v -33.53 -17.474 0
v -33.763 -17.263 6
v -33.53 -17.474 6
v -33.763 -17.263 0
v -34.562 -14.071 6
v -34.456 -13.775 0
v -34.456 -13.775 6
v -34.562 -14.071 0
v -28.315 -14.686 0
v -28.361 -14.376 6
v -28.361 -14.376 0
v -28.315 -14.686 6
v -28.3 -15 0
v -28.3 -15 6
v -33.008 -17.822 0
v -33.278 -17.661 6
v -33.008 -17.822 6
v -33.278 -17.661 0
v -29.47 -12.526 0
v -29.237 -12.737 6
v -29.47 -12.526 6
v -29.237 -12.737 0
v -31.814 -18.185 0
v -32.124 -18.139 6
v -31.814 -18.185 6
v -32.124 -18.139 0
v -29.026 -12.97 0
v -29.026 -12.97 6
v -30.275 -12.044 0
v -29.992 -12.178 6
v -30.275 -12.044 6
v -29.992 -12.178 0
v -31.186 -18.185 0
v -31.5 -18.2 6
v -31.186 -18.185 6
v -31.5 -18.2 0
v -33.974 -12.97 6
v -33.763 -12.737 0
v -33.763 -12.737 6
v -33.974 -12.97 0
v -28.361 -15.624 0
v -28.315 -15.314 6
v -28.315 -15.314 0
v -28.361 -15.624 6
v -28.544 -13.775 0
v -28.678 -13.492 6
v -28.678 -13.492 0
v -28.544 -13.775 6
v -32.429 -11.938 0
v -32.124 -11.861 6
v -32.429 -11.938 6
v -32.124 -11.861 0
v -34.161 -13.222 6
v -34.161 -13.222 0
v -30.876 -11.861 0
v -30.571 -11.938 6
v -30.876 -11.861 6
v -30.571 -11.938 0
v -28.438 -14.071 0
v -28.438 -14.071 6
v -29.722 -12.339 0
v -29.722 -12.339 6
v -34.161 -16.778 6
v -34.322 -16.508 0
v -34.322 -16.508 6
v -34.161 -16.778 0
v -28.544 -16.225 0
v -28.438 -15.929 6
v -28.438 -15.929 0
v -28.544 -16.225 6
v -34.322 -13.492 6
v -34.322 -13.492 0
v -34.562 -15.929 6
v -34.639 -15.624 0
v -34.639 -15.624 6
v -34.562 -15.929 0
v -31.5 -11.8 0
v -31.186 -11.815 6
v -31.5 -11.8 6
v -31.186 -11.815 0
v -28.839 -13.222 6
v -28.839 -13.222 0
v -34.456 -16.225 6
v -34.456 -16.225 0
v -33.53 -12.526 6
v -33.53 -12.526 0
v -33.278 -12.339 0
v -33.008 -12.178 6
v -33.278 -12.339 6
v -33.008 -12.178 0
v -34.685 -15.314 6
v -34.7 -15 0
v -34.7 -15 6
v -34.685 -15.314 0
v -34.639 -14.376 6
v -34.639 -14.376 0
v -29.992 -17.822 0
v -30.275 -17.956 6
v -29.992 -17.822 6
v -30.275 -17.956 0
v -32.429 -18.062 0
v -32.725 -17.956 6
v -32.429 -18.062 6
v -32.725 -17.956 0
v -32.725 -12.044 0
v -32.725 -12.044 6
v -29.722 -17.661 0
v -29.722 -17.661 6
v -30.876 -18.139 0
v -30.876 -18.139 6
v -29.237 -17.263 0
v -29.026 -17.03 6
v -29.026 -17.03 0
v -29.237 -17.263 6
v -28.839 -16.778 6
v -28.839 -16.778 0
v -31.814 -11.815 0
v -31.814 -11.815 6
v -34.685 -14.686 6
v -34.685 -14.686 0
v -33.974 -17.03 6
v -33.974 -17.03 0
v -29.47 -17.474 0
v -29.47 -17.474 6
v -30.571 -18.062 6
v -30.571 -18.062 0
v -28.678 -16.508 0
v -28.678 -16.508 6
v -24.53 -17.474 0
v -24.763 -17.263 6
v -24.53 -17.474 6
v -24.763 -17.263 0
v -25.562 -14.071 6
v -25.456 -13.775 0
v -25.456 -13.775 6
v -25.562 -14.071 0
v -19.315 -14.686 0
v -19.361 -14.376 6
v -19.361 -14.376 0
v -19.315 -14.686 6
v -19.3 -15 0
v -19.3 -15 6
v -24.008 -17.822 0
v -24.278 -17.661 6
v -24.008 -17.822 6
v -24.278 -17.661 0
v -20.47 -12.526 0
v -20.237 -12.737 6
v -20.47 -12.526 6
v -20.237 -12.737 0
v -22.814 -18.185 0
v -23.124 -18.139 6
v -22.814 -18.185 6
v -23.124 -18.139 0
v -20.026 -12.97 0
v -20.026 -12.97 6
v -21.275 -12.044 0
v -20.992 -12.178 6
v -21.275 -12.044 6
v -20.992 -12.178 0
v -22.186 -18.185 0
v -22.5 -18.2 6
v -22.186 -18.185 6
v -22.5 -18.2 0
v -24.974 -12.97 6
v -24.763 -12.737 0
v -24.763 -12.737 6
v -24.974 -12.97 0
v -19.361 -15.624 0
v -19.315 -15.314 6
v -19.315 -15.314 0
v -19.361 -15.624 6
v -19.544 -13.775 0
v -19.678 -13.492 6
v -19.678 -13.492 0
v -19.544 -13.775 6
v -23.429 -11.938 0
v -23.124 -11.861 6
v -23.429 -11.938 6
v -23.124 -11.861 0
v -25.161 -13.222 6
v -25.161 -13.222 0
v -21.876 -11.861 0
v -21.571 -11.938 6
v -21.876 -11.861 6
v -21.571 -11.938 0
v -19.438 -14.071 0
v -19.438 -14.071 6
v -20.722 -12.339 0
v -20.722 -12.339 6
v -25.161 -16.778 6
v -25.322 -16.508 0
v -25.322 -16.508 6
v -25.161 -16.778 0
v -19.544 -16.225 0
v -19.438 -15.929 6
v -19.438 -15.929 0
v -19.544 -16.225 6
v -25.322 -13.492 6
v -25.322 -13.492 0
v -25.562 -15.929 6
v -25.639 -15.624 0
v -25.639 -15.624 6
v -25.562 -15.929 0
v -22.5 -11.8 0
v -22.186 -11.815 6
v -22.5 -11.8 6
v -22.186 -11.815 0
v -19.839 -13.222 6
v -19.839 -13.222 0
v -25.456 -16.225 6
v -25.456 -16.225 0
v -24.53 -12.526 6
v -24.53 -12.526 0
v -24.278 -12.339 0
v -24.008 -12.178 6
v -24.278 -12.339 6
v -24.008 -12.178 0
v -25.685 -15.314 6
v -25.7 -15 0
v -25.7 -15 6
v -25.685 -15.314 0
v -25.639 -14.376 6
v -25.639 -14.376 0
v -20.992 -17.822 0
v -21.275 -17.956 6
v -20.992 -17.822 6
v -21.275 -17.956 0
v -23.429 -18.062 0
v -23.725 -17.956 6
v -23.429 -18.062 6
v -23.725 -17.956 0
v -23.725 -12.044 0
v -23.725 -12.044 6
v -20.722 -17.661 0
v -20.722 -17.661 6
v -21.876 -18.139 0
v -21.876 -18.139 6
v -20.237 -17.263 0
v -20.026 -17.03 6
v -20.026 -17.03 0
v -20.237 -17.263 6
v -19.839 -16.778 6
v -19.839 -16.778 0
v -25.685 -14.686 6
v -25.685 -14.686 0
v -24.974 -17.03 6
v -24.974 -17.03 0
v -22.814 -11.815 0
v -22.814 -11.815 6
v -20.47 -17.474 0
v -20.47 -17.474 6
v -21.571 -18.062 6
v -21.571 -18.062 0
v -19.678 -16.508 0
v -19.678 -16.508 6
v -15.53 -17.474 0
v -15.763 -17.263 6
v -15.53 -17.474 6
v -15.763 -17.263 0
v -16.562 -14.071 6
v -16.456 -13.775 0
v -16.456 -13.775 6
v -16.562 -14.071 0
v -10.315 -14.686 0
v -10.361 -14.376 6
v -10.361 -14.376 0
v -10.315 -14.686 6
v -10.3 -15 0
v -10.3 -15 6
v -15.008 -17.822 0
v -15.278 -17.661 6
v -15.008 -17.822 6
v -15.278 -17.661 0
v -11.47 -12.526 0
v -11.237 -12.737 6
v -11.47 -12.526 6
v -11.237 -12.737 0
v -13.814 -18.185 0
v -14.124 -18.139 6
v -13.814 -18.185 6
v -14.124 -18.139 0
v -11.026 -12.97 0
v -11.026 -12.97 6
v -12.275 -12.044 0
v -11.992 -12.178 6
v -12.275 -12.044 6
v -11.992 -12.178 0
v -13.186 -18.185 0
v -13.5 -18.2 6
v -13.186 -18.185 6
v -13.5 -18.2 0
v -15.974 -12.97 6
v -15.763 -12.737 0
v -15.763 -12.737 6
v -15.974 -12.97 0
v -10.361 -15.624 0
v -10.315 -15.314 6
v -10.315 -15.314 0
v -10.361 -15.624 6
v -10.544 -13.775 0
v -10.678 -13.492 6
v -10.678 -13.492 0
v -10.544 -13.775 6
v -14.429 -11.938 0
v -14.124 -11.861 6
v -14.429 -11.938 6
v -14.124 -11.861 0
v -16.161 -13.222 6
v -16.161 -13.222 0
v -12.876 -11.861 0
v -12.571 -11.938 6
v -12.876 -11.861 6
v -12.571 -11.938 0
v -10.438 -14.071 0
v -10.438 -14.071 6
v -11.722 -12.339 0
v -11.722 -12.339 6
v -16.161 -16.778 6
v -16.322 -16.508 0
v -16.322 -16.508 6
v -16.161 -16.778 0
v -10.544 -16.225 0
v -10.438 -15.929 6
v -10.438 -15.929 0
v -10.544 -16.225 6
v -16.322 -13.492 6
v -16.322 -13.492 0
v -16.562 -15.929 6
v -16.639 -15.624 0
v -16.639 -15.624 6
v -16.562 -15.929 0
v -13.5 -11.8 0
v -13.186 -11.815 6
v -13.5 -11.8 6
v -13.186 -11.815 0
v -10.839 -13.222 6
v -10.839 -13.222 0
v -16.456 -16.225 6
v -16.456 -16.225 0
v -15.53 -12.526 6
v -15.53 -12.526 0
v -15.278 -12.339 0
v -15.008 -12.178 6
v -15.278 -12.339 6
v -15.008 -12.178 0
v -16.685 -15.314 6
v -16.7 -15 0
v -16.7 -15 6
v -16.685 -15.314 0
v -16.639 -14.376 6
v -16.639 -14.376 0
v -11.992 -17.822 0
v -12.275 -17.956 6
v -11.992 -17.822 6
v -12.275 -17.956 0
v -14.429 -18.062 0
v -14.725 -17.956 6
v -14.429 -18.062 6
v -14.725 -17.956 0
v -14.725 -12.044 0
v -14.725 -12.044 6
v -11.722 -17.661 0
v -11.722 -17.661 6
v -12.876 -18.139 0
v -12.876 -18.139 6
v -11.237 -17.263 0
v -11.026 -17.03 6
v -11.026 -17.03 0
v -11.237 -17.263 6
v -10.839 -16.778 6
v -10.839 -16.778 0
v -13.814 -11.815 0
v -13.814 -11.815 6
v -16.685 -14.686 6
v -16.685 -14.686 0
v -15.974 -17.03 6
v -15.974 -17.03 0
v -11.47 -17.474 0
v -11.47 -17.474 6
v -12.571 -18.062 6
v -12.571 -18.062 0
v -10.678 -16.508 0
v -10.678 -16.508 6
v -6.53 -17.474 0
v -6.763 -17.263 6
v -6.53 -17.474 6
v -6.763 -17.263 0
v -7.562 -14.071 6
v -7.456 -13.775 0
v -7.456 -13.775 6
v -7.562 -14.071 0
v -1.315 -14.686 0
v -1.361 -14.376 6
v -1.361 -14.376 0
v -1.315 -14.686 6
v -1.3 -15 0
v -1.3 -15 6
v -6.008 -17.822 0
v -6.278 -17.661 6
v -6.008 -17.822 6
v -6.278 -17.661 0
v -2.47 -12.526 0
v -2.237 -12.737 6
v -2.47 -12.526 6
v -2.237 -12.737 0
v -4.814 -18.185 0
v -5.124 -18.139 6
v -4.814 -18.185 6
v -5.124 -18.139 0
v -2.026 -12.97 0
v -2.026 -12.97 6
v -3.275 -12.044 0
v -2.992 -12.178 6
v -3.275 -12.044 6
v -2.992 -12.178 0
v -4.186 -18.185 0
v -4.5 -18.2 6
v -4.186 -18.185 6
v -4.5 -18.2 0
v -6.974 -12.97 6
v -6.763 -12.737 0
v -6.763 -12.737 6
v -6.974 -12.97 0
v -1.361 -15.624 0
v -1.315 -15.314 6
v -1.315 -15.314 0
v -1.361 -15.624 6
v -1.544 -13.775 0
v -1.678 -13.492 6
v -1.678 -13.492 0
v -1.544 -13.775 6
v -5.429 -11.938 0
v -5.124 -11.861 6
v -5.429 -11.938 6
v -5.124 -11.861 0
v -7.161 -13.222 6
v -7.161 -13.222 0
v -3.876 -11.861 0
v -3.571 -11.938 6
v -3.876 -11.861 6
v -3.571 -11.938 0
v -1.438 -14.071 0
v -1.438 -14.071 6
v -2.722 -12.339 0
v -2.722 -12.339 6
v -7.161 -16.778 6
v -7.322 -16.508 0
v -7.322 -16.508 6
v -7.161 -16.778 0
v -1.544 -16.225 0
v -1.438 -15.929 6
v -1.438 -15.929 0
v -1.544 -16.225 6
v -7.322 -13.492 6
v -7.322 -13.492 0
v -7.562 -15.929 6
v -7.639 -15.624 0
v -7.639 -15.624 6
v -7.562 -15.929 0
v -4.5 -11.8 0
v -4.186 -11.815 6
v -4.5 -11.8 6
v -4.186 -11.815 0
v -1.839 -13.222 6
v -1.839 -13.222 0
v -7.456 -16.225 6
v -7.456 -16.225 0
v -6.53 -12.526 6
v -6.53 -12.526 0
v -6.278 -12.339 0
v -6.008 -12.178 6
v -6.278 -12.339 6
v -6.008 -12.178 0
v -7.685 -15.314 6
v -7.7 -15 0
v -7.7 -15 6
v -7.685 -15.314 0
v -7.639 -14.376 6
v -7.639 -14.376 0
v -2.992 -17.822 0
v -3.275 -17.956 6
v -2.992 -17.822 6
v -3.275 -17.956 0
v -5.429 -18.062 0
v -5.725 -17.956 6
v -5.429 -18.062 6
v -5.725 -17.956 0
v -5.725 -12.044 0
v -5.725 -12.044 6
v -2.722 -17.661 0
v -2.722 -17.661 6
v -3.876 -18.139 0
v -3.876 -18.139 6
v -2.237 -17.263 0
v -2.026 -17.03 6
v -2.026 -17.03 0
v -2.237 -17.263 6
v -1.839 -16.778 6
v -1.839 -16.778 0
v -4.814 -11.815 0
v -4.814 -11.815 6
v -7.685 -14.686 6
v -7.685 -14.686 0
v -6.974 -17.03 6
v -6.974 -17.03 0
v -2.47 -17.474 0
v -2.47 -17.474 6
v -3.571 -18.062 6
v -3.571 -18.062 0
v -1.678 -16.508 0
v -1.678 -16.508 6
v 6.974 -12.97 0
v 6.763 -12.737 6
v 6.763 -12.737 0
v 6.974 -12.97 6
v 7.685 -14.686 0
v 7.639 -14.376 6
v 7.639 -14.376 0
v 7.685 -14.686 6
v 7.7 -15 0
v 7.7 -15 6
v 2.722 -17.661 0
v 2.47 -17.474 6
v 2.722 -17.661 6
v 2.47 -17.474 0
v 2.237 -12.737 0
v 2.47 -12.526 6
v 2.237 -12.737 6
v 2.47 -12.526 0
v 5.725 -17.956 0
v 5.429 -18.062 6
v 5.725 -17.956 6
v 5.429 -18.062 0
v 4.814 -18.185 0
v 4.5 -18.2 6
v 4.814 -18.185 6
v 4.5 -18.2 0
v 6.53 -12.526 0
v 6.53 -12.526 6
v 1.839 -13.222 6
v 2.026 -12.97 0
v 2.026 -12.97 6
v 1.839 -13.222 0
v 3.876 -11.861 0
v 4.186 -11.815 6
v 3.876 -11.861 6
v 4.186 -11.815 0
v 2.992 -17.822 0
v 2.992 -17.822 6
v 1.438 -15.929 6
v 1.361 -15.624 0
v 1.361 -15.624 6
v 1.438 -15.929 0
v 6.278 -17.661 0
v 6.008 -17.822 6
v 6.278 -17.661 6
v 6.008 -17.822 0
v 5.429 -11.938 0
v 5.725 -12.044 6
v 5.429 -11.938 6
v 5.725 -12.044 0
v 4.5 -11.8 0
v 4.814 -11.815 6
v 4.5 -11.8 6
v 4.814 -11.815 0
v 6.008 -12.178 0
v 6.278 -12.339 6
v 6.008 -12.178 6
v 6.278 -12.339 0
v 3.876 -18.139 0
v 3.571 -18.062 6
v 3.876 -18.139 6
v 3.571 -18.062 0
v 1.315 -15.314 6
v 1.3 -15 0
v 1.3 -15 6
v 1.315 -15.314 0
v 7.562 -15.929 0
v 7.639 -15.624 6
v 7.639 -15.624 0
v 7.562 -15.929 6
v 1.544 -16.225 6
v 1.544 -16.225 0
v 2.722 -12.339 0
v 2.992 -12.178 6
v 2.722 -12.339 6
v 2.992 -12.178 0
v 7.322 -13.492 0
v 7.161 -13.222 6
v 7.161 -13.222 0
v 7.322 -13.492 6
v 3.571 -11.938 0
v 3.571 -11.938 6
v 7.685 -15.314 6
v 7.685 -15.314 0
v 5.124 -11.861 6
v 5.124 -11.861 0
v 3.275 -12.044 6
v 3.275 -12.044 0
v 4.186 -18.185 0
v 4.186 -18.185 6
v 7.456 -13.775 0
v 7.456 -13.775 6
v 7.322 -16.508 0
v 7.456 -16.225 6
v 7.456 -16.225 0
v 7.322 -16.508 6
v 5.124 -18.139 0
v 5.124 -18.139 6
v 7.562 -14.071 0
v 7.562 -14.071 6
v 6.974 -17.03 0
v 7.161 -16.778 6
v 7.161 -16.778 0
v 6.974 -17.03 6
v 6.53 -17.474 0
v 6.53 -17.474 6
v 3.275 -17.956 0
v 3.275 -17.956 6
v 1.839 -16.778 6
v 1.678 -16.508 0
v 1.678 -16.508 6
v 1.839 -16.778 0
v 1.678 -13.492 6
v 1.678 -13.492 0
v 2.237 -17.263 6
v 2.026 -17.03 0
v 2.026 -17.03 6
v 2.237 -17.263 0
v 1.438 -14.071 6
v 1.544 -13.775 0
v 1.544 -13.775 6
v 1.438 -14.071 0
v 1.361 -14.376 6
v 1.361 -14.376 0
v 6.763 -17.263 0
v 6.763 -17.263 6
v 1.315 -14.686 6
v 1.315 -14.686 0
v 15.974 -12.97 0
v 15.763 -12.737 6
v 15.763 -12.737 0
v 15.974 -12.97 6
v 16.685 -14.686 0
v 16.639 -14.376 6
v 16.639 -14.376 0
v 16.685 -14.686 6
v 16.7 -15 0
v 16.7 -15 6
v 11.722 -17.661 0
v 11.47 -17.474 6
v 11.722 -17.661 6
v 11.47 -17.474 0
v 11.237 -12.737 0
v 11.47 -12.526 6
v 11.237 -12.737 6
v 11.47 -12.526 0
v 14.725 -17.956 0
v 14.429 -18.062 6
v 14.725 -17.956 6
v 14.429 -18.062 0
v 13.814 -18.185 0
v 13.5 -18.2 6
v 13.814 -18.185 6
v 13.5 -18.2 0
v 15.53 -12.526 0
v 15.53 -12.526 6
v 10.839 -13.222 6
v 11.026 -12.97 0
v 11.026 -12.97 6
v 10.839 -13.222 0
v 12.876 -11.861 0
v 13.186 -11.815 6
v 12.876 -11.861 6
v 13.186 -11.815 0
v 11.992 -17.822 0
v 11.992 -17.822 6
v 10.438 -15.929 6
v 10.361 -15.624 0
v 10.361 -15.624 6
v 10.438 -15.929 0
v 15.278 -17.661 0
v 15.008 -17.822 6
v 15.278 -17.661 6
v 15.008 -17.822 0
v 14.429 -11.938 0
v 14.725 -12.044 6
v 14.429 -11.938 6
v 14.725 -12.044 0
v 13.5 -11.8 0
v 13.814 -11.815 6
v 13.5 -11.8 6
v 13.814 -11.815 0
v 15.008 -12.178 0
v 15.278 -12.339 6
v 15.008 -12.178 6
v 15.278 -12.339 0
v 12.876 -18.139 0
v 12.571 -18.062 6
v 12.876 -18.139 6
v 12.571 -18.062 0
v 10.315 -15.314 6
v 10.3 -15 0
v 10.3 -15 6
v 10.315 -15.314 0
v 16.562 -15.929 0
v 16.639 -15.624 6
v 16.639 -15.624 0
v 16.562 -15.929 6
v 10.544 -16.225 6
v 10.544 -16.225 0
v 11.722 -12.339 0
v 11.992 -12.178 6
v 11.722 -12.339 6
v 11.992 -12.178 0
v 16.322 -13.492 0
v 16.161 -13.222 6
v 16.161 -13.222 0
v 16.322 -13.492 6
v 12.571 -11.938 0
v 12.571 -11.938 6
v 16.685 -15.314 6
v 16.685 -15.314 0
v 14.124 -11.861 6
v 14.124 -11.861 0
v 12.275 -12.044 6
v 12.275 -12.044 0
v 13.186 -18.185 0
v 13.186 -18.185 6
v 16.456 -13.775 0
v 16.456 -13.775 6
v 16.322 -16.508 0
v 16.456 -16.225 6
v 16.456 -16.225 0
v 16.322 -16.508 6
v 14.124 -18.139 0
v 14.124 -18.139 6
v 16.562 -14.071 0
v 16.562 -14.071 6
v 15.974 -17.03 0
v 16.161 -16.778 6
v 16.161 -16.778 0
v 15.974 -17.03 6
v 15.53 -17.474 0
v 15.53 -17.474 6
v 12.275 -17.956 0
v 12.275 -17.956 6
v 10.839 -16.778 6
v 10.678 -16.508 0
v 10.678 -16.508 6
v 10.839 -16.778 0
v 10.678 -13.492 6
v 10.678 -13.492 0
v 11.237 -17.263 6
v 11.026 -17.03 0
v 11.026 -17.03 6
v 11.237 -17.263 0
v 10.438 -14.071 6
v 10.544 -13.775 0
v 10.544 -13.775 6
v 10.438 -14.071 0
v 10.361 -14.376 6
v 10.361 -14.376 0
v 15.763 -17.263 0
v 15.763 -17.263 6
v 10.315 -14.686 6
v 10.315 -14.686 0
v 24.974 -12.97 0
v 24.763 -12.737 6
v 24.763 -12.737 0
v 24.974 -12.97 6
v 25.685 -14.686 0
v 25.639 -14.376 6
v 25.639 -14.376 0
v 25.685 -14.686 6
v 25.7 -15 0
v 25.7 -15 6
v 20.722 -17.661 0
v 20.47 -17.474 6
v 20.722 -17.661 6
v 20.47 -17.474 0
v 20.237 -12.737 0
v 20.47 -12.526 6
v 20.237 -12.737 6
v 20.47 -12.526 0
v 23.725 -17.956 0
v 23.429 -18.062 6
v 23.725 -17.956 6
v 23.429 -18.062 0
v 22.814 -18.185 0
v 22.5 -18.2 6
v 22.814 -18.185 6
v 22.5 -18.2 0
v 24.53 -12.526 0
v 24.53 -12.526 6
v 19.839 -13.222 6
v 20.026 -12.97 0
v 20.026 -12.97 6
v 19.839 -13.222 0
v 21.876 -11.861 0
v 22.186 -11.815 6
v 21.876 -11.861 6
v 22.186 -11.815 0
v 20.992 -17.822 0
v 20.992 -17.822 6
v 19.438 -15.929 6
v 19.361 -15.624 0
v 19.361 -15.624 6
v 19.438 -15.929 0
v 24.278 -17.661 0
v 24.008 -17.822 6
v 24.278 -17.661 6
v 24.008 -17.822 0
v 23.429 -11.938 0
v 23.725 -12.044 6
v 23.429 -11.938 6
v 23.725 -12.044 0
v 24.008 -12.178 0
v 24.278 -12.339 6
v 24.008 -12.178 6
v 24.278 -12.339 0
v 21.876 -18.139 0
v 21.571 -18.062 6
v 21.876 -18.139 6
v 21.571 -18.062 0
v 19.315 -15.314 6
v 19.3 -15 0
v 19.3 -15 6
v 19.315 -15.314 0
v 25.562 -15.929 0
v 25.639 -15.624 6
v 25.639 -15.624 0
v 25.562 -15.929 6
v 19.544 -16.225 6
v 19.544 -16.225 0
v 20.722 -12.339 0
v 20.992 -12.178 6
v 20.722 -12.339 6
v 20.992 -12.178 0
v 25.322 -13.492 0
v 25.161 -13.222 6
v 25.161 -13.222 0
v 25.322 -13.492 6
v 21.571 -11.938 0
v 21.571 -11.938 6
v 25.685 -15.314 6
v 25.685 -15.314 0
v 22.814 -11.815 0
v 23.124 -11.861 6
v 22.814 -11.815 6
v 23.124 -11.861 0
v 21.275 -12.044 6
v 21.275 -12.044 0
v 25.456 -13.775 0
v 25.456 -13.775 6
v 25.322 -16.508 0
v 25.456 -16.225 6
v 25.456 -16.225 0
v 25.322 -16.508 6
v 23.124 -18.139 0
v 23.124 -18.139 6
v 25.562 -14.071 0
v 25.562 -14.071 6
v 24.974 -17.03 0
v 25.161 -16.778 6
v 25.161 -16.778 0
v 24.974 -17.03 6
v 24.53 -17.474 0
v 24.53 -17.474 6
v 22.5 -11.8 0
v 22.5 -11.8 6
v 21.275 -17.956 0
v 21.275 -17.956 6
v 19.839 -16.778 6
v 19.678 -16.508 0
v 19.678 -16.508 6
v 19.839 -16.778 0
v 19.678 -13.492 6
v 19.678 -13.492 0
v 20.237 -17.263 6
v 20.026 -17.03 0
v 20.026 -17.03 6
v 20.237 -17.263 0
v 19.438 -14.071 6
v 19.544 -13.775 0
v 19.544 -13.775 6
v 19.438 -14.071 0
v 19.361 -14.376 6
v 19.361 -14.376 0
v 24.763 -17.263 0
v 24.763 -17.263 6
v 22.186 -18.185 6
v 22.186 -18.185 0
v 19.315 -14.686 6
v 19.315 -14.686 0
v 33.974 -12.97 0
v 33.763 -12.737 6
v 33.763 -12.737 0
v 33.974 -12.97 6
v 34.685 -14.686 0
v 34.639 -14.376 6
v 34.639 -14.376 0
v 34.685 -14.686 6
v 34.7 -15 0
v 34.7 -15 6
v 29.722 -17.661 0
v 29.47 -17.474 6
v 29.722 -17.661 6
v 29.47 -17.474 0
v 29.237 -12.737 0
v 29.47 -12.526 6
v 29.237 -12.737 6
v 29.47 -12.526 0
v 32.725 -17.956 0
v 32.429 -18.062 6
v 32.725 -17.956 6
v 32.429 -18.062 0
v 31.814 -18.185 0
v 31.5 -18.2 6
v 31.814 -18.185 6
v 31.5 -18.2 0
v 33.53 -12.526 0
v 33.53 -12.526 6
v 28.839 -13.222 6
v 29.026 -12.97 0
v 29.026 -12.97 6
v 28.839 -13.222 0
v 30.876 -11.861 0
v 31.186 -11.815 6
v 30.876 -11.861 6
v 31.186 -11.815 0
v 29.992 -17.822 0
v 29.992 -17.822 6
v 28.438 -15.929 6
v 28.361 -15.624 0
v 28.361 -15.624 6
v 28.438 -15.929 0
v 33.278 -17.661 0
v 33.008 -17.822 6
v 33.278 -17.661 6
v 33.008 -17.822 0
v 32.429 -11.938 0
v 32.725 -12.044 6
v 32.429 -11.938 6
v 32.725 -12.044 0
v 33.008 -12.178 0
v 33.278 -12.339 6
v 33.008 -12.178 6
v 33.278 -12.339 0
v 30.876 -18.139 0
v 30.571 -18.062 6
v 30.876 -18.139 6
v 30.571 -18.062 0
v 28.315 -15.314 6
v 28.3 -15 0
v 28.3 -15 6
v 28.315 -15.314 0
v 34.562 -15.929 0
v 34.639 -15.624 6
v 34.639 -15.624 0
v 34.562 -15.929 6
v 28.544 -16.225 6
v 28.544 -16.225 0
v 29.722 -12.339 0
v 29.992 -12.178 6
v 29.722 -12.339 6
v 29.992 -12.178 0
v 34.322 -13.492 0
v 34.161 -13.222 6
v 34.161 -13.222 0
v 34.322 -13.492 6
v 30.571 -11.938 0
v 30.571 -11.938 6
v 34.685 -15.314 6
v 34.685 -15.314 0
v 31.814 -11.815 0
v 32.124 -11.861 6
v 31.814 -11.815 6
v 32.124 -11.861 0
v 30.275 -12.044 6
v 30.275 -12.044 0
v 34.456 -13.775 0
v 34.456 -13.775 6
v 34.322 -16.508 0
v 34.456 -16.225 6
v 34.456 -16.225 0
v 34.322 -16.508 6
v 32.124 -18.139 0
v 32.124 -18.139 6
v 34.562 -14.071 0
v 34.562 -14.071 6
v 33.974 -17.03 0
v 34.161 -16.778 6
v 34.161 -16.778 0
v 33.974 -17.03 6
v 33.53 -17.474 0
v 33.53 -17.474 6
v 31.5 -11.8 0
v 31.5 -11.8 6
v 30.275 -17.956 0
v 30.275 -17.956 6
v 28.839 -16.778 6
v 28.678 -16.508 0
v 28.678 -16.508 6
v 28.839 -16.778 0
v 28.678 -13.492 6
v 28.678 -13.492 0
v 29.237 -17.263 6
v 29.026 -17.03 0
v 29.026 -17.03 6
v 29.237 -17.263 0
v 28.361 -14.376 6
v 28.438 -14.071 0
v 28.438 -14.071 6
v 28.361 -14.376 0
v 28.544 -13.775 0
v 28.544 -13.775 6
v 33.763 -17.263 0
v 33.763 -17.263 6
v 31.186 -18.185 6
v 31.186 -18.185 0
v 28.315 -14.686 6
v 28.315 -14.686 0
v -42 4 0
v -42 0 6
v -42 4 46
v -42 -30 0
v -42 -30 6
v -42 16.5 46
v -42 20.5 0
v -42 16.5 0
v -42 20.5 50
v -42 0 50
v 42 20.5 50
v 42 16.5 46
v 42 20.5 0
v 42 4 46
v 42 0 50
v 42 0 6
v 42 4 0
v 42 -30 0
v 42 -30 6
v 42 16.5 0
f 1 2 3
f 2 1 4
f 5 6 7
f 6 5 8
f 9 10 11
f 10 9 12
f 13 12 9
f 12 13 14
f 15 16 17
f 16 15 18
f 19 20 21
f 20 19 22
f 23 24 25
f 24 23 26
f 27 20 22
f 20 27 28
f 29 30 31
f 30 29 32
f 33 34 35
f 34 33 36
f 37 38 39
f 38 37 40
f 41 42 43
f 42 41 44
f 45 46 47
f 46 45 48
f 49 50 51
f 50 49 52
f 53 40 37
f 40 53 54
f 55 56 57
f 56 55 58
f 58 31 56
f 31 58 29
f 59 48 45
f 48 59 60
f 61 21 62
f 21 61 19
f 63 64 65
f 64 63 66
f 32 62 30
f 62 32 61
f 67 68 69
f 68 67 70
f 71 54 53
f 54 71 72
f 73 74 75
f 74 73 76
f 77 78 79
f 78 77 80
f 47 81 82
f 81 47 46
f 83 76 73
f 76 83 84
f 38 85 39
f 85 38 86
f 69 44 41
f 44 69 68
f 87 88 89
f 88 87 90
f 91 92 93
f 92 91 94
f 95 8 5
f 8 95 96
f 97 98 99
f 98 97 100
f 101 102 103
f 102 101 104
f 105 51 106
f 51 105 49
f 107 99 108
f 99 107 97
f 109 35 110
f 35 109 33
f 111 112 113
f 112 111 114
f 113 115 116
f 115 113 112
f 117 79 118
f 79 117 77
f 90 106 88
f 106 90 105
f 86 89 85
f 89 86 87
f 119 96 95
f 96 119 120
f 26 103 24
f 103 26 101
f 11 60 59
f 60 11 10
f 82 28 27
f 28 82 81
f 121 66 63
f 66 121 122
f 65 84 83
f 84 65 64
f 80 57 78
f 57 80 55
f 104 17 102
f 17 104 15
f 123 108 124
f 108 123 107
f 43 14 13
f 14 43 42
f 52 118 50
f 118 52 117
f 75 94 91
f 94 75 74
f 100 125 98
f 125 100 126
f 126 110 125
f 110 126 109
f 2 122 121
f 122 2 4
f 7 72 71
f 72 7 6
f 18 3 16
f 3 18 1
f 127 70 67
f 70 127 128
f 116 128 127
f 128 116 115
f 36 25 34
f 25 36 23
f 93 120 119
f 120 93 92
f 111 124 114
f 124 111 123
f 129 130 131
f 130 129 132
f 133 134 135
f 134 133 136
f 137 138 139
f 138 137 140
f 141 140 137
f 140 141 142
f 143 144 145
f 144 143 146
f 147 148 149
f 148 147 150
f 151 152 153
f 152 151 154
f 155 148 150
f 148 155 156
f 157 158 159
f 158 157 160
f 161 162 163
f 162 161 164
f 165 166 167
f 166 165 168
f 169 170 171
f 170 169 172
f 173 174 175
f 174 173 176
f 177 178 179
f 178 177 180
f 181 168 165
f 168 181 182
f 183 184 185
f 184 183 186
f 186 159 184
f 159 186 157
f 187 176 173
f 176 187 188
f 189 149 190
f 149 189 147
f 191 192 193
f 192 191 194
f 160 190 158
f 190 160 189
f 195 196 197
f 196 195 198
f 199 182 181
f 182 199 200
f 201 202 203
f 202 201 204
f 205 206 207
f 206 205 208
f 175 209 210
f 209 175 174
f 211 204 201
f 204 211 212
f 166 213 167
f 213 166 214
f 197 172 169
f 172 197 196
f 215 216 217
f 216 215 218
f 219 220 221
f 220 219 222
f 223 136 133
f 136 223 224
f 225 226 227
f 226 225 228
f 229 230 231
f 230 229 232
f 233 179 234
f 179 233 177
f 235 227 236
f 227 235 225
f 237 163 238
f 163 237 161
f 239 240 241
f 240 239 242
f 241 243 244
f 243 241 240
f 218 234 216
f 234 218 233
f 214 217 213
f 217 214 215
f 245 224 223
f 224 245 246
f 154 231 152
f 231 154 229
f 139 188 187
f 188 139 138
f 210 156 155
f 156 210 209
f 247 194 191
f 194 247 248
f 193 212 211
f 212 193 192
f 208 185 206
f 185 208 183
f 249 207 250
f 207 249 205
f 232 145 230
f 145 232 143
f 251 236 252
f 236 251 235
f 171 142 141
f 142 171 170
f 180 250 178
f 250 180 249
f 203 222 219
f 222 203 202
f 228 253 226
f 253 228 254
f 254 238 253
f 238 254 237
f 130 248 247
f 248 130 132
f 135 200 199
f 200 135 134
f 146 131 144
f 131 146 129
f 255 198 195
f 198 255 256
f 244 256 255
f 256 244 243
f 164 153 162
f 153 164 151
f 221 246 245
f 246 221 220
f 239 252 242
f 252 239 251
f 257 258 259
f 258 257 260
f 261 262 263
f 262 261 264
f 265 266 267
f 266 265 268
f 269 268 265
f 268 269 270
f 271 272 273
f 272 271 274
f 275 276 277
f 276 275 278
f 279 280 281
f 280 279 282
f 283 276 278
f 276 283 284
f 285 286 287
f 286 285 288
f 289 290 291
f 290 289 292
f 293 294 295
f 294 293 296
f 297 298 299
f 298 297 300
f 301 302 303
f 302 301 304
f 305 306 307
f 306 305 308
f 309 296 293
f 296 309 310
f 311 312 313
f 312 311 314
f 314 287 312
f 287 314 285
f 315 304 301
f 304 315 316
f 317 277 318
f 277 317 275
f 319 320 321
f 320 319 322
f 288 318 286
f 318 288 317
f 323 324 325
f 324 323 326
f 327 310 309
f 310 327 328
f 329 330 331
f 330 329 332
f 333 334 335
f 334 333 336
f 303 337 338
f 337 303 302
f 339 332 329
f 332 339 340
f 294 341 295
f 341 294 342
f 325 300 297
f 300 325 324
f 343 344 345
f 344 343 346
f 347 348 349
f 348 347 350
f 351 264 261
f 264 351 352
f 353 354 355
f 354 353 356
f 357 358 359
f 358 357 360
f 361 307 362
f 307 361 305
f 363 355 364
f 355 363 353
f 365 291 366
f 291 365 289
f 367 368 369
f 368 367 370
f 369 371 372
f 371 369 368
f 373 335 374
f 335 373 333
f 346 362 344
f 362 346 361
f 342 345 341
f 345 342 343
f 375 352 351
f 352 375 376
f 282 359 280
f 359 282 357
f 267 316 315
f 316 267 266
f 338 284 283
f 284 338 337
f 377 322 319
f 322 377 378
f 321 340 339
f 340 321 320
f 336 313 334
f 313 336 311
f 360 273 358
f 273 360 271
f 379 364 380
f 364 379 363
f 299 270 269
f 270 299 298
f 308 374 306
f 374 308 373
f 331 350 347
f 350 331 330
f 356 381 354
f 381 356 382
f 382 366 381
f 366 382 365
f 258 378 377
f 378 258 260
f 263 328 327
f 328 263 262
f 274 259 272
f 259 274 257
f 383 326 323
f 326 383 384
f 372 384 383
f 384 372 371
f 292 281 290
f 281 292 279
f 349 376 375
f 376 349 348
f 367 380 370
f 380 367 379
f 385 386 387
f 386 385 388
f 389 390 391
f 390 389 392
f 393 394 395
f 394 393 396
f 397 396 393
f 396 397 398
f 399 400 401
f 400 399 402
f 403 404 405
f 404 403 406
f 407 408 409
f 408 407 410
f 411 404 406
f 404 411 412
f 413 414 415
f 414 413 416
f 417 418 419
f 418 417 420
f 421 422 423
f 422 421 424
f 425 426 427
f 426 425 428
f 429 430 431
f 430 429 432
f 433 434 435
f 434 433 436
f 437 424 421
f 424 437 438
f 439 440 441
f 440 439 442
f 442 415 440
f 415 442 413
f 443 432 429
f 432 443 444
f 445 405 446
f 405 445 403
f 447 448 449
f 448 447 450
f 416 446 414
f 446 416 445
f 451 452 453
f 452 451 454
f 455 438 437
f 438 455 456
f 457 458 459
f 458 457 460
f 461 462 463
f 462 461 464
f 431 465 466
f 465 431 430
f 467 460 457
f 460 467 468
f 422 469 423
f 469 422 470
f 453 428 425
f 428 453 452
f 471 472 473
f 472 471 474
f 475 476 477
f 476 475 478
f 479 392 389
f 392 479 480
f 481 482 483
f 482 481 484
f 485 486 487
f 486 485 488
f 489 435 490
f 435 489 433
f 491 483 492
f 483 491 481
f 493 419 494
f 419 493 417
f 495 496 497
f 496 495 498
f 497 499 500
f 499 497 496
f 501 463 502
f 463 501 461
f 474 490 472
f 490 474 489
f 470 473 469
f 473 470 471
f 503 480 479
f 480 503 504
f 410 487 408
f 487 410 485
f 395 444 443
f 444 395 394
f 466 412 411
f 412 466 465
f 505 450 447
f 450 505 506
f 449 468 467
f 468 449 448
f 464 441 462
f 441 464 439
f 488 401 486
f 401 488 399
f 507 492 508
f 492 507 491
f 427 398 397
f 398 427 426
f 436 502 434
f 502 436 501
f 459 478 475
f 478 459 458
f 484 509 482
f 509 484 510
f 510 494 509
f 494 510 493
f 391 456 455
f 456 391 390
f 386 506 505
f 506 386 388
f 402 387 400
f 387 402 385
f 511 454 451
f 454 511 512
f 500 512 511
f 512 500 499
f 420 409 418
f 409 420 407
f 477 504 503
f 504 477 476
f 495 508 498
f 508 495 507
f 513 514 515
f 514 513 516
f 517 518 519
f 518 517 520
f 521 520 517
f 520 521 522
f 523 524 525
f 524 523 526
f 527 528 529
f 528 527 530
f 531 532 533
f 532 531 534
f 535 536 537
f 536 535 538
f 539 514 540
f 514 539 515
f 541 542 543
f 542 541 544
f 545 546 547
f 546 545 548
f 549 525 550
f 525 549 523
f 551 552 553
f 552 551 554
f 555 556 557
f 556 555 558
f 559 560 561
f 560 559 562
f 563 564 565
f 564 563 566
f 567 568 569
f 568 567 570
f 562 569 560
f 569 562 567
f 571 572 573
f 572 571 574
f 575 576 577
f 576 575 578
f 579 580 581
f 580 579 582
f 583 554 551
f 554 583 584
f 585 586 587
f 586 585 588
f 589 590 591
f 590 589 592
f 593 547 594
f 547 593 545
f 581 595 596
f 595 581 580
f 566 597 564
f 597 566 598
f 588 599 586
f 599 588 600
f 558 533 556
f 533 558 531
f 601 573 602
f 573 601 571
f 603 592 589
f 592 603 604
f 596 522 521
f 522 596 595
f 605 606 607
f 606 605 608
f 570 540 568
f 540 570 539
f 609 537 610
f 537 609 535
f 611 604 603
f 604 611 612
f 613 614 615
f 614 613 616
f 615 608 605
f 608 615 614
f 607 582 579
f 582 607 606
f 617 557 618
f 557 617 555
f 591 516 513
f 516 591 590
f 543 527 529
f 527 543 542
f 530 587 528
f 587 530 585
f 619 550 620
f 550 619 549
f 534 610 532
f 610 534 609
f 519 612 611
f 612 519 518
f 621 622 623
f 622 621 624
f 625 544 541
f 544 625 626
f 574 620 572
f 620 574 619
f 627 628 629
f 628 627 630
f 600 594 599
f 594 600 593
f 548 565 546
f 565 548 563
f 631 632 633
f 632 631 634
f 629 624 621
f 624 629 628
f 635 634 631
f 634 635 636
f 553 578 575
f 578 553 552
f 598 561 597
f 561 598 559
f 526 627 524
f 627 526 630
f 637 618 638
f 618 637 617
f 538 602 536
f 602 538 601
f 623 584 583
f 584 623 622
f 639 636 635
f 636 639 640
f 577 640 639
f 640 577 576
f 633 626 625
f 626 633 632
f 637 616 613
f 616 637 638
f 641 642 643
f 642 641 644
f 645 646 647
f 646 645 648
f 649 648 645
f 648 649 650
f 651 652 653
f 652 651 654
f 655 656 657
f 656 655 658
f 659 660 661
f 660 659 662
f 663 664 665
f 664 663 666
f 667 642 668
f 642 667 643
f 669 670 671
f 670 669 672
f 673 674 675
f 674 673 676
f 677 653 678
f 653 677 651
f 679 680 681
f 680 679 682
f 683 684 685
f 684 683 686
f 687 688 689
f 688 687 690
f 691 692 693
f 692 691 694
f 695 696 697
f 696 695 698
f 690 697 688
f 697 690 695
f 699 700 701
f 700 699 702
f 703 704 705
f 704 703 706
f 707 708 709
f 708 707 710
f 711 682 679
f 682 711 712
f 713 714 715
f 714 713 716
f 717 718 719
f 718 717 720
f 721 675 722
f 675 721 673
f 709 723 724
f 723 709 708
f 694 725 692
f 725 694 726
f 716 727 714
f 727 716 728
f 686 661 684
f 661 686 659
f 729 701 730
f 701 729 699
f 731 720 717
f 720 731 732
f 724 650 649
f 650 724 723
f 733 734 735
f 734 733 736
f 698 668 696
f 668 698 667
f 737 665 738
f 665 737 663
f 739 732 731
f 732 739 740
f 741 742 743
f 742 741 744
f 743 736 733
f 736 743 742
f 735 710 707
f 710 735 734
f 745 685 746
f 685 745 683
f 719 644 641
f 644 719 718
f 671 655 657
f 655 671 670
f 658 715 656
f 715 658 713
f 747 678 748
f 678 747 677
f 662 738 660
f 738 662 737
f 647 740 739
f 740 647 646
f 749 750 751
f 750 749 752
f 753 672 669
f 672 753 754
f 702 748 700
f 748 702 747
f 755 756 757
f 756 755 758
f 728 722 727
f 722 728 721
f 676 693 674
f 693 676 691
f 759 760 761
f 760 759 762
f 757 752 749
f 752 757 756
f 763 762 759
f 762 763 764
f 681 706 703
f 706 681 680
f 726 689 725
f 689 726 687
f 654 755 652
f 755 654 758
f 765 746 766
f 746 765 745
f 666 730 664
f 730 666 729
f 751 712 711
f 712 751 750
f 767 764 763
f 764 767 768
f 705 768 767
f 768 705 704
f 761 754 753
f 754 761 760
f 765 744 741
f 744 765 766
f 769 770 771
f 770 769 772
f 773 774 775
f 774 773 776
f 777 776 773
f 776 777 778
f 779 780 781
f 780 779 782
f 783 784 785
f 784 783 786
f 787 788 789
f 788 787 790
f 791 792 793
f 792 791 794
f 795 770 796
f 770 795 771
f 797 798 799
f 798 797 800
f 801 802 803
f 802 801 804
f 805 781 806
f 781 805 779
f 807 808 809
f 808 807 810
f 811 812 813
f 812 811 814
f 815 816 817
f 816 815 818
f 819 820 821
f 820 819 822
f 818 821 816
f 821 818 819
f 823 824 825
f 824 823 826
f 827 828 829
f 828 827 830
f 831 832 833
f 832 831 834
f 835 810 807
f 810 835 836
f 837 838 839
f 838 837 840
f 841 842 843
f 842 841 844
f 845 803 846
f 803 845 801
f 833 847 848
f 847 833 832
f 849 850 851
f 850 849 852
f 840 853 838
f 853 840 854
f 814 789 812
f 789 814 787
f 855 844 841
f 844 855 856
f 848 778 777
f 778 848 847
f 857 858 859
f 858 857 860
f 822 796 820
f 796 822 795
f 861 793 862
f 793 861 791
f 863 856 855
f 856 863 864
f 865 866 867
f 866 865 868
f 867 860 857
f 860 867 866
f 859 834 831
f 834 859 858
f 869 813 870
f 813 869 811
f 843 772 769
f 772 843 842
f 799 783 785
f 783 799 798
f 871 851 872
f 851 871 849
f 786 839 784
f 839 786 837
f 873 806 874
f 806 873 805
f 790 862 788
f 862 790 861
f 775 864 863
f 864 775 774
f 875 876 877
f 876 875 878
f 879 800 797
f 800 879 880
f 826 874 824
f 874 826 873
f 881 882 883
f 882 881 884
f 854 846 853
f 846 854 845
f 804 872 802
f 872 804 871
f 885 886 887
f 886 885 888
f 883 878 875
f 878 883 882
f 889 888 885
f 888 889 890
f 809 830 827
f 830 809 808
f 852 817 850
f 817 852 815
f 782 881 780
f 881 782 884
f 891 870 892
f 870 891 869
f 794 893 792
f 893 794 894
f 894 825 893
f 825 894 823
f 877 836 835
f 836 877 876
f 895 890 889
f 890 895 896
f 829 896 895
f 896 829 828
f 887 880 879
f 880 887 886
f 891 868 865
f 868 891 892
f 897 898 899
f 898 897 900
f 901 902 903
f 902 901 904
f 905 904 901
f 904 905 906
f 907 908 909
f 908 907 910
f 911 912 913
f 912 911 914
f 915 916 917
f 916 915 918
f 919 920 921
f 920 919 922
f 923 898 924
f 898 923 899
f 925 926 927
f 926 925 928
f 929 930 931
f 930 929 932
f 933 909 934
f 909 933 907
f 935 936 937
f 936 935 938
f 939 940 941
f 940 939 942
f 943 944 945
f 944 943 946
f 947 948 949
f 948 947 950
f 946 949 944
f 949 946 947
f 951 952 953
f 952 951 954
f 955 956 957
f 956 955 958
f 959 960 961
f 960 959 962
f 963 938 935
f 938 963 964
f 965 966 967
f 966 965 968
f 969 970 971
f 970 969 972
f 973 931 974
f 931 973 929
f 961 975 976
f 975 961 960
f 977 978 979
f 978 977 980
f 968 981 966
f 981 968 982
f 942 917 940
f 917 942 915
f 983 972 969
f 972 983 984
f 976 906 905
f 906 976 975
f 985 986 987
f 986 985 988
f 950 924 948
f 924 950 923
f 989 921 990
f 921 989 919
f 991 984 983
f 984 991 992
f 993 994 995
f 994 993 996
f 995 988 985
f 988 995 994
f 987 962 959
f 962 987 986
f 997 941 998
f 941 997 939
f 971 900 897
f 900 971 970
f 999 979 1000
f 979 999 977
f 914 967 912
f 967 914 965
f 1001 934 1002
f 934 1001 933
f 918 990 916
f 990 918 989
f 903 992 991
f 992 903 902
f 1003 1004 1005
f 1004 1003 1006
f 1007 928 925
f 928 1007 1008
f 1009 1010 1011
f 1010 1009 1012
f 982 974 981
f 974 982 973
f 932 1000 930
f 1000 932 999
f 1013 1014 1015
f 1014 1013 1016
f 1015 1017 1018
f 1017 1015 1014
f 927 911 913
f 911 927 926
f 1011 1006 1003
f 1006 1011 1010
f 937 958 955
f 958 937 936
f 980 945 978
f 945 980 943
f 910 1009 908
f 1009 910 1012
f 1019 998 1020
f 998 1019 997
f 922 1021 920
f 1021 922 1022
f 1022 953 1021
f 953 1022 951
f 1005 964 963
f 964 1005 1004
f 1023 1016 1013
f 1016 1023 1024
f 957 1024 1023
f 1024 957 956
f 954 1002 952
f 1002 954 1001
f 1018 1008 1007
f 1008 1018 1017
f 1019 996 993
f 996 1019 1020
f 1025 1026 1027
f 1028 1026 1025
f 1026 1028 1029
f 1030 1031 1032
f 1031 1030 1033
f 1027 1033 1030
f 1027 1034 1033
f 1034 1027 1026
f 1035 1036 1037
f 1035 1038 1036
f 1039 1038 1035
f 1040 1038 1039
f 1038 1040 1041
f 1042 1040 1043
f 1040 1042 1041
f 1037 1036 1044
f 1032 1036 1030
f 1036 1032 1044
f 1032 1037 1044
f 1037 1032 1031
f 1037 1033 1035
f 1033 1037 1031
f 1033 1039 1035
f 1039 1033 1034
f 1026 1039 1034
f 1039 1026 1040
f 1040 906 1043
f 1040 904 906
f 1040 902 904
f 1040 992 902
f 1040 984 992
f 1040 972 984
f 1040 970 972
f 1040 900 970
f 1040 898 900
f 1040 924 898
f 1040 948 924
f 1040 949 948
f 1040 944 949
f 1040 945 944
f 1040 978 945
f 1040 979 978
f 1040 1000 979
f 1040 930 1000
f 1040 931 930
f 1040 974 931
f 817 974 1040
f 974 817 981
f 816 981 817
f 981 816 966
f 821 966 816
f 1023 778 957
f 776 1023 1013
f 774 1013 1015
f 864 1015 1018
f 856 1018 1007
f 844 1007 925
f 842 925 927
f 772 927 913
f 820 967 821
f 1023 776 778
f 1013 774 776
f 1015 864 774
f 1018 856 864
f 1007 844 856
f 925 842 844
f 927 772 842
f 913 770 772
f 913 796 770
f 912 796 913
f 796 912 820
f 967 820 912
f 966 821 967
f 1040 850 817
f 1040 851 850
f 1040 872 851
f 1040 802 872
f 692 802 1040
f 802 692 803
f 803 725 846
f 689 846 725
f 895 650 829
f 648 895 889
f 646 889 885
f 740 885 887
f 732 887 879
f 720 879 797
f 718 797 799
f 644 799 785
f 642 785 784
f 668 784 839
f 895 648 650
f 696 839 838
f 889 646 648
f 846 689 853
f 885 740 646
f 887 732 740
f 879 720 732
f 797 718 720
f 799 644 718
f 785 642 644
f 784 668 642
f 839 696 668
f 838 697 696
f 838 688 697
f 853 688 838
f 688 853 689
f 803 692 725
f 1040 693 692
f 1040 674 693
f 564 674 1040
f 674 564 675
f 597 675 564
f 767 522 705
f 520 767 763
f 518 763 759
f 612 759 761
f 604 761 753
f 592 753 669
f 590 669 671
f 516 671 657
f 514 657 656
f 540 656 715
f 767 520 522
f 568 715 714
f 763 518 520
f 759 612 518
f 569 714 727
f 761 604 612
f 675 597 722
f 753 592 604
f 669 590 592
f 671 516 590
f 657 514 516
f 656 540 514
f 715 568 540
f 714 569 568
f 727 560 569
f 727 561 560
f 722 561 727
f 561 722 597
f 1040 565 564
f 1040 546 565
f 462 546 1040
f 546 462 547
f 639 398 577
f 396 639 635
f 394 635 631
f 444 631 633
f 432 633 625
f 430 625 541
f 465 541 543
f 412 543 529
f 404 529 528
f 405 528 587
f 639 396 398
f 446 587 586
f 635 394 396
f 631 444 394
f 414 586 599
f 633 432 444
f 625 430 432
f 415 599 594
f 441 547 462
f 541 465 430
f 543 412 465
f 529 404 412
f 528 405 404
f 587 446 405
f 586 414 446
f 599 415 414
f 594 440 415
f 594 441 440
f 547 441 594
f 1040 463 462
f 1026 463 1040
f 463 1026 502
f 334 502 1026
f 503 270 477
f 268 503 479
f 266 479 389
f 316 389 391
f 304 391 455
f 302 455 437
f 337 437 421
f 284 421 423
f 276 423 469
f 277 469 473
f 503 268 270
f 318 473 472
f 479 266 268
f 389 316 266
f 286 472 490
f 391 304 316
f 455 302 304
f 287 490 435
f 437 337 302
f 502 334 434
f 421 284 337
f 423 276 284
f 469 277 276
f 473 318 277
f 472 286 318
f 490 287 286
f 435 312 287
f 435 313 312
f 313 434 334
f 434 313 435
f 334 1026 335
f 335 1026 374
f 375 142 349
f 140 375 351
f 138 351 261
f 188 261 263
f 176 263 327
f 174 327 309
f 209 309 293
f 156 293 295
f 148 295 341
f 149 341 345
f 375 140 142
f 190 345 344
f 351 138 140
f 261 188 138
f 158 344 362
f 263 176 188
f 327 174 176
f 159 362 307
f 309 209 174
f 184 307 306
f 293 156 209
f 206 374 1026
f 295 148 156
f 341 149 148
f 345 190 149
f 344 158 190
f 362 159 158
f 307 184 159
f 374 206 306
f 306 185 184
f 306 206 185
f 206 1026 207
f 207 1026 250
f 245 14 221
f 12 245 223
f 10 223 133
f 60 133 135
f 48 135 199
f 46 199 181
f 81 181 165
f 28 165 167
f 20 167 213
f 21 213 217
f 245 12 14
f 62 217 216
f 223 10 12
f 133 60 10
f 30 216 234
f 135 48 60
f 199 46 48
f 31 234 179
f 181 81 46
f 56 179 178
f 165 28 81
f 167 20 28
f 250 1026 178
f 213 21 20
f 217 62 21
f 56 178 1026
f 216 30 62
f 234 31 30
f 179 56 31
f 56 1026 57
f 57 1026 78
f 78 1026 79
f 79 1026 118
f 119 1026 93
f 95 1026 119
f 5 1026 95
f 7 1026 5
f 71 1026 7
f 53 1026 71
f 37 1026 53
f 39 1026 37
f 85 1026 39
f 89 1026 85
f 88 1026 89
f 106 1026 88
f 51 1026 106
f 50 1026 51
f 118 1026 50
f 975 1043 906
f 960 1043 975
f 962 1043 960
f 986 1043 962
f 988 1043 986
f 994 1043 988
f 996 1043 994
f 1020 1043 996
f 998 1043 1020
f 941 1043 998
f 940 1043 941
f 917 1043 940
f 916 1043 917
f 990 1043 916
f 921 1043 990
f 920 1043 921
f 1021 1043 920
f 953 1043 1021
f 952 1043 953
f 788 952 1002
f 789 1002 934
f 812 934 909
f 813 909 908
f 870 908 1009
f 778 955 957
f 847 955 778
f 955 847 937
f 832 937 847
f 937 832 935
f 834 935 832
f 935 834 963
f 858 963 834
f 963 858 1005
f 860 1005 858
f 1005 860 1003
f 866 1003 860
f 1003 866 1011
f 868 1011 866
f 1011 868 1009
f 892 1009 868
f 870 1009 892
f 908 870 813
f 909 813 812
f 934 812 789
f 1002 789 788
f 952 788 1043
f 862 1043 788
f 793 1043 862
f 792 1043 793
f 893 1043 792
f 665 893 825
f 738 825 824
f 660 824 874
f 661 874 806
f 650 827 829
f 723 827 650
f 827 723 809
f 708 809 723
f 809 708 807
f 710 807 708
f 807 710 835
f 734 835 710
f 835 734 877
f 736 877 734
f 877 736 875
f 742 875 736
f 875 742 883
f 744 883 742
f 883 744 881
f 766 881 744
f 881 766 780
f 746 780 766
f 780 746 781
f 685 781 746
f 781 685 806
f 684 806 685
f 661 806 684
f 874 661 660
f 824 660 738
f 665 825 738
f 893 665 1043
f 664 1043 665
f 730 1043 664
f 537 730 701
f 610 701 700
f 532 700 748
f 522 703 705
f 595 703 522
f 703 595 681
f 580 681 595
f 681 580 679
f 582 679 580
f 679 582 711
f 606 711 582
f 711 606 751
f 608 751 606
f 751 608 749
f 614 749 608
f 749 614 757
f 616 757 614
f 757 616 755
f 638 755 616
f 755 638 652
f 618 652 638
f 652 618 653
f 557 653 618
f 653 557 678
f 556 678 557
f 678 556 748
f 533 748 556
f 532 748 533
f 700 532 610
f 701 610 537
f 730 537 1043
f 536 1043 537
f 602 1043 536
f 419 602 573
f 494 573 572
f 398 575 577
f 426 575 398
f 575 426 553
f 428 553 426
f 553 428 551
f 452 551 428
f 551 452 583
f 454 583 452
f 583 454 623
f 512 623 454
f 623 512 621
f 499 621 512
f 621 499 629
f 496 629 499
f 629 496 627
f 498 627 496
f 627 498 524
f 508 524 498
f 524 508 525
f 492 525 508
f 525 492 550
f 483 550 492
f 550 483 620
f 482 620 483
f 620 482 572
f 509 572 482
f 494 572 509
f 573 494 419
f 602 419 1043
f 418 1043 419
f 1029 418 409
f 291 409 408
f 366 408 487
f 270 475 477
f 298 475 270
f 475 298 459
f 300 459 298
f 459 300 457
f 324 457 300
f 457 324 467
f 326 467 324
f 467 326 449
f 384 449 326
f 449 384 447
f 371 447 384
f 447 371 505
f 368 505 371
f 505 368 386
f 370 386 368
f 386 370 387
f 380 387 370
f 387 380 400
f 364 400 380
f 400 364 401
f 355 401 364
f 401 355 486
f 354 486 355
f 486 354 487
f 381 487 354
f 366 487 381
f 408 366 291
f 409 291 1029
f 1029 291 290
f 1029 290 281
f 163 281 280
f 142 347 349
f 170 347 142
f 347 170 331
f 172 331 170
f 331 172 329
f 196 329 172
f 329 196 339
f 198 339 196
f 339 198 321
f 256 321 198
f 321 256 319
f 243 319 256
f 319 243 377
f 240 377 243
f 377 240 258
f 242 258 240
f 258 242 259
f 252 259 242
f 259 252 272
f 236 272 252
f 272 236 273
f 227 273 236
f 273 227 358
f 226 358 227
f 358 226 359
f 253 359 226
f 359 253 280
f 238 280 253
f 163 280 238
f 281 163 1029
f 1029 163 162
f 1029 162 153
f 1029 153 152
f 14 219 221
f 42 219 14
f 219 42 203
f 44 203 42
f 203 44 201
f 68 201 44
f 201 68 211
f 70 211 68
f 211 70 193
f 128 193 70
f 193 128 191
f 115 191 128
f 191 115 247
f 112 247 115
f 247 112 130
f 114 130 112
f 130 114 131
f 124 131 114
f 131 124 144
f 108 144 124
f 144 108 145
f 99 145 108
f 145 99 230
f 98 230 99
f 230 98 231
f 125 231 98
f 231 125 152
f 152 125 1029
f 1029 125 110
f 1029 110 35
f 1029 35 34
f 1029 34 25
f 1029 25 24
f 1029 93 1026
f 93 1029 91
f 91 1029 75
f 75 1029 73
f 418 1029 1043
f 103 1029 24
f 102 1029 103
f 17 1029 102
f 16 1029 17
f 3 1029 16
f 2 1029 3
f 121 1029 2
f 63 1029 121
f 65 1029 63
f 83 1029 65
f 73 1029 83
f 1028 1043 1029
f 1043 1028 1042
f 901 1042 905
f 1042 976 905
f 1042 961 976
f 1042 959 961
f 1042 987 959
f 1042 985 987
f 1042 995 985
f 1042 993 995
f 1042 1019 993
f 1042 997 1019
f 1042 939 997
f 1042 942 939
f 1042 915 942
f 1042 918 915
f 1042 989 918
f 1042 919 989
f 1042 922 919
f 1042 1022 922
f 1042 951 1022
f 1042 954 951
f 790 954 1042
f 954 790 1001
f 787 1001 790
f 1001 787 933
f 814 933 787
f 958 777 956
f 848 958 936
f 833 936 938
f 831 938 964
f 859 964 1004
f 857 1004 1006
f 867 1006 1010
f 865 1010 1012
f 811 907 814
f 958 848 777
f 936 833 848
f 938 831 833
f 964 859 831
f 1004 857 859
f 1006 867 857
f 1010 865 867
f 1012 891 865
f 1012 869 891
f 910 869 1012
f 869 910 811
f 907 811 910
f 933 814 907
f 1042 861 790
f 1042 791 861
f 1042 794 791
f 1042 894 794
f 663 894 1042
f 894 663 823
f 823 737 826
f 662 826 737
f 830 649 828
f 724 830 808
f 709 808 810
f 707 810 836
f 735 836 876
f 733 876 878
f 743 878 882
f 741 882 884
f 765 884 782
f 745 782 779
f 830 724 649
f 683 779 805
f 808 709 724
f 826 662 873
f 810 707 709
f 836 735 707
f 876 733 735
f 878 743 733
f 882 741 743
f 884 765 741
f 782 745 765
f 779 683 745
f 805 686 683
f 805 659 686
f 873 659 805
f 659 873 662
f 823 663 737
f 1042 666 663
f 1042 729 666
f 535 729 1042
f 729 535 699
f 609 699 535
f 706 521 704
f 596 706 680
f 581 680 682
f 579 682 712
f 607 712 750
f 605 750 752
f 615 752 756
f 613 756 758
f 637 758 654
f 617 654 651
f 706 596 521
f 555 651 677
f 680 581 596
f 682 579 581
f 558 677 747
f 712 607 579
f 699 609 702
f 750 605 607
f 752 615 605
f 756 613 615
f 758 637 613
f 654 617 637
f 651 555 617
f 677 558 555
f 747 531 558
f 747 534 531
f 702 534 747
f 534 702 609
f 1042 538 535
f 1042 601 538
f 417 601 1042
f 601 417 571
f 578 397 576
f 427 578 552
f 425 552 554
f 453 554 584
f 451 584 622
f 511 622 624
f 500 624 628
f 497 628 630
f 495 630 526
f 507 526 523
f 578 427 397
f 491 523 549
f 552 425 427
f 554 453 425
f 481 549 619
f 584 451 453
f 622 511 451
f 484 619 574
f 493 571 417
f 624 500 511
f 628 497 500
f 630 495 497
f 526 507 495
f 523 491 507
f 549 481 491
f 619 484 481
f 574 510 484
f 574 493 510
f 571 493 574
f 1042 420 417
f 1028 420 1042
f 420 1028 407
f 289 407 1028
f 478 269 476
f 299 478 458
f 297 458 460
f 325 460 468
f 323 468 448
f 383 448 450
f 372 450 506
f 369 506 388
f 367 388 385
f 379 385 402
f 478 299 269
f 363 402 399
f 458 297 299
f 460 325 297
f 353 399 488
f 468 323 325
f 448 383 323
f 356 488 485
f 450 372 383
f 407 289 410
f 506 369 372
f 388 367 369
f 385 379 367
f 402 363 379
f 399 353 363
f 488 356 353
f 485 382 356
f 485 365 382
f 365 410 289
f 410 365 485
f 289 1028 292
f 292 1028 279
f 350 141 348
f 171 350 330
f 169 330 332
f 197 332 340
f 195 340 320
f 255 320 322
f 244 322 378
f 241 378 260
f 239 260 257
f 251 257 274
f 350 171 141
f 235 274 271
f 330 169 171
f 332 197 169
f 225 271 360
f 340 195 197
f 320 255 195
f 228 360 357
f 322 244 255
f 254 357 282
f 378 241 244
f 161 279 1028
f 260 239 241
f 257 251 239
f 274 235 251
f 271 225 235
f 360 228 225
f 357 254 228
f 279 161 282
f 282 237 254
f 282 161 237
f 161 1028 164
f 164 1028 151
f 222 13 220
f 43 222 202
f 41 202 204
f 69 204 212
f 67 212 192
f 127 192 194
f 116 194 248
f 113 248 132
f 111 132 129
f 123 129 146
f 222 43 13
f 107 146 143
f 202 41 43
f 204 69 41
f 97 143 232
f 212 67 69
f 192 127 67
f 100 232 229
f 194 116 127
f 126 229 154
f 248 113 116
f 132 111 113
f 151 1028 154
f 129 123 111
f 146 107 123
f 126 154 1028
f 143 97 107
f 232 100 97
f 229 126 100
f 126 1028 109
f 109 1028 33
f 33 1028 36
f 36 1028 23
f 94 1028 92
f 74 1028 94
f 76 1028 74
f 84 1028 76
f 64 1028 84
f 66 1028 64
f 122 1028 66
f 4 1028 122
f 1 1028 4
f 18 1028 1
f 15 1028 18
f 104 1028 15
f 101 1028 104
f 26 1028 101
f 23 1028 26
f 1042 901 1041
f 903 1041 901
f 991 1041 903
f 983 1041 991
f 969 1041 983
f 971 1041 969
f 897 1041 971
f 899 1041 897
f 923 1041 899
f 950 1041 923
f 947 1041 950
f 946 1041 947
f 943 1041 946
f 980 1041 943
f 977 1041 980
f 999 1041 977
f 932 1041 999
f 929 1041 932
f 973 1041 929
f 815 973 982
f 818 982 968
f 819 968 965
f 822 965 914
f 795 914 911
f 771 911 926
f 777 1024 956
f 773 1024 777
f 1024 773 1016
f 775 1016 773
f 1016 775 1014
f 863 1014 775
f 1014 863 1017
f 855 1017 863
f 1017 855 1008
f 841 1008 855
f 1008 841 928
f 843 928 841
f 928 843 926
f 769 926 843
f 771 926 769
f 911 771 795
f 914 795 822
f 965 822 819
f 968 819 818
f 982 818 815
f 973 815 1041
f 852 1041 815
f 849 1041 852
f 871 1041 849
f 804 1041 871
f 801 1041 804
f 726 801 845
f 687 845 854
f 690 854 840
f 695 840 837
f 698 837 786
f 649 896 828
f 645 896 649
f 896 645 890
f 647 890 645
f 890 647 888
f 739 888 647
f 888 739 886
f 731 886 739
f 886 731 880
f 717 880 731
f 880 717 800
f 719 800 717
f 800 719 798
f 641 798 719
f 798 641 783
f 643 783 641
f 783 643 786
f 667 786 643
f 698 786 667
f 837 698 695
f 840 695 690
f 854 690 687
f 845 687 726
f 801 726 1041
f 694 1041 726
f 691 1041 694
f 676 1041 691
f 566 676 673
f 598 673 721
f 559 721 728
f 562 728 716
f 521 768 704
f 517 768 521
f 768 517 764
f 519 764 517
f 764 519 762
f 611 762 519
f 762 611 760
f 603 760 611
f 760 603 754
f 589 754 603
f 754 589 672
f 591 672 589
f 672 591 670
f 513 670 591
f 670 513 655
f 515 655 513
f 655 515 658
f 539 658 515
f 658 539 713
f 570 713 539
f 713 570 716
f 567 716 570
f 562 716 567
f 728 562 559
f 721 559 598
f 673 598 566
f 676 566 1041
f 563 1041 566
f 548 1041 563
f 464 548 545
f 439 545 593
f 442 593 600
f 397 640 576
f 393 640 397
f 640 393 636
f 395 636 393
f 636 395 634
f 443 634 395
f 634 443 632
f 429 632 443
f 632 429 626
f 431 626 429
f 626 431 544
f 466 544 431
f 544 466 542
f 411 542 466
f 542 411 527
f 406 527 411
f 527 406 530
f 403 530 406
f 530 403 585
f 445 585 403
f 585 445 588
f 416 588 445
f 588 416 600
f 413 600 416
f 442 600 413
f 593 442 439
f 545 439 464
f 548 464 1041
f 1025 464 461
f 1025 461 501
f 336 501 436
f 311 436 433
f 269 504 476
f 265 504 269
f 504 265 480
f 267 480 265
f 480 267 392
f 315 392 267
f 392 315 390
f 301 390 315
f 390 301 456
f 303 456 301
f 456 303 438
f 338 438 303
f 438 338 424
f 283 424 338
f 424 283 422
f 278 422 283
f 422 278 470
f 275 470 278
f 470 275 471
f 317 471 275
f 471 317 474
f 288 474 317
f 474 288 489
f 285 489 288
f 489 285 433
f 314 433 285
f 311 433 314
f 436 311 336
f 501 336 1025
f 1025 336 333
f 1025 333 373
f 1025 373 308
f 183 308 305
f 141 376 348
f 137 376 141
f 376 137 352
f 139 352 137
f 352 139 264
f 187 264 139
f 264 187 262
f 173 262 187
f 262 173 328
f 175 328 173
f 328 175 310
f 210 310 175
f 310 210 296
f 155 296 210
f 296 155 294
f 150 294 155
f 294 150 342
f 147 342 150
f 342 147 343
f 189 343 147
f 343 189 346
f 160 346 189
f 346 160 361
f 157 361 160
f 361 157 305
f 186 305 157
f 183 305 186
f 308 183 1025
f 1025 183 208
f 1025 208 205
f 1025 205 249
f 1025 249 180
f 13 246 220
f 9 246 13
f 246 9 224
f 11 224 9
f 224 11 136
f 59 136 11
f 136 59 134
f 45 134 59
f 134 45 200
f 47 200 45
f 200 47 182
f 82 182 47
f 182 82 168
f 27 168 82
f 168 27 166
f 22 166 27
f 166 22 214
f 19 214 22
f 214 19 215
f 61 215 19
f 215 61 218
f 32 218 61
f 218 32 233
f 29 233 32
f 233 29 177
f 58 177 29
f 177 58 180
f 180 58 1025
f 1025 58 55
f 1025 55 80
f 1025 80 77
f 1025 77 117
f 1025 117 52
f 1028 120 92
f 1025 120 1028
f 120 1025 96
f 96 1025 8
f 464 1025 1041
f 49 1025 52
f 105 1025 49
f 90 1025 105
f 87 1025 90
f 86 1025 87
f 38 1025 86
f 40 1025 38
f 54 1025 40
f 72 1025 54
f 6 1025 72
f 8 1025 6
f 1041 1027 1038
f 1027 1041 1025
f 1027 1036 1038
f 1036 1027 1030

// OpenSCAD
// Ice-bucket hanging PCR strip holder (8 tubes)
$fn = 64;

length_x      = 84;    // extrusion length along X
inner_y0      = 0;     // inner leg start y
inner_t       = 4;     // inner leg thickness
outer_y0      = 16.5;  // outer leg start y
outer_t       = 4;     // outer leg thickness
height        = 50;    // overall height
bridge_t      = 4;     // bridge thickness (z = 46..50)
ledge_len     = 30;    // ledge reach toward -Y
ledge_t       = 6;     // ledge thickness
hole_d        = 6.4;   // tube hole diameter
hole_count    = 8;     // number of holes
hole_pitch    = 9;     // spacing along X
hole_y        = -15;   // hole centre y

module profile() {
    // inner leg
    translate([inner_y0, 0]) square([inner_t, height]);
    // outer leg
    translate([outer_y0, 0]) square([outer_t, height]);
    // bridge
    translate([inner_y0, height - bridge_t])
        square([outer_y0 + outer_t - inner_y0, bridge_t]);
    // ledge
    translate([-ledge_len, 0]) square([ledge_len + inner_t, ledge_t]);
}

difference() {
    // extrude profile (2D x->Y, 2D y->Z) along X, centred
    rotate([90, 0, 90])
        translate([0, 0, -length_x / 2])
            linear_extrude(height = length_x) profile();

    // tube holes
    for (i = [0 : hole_count - 1])
        translate([(i - (hole_count - 1) / 2) * hole_pitch, hole_y, -1])
            cylinder(d = hole_d, h = ledge_t + 2);
}
